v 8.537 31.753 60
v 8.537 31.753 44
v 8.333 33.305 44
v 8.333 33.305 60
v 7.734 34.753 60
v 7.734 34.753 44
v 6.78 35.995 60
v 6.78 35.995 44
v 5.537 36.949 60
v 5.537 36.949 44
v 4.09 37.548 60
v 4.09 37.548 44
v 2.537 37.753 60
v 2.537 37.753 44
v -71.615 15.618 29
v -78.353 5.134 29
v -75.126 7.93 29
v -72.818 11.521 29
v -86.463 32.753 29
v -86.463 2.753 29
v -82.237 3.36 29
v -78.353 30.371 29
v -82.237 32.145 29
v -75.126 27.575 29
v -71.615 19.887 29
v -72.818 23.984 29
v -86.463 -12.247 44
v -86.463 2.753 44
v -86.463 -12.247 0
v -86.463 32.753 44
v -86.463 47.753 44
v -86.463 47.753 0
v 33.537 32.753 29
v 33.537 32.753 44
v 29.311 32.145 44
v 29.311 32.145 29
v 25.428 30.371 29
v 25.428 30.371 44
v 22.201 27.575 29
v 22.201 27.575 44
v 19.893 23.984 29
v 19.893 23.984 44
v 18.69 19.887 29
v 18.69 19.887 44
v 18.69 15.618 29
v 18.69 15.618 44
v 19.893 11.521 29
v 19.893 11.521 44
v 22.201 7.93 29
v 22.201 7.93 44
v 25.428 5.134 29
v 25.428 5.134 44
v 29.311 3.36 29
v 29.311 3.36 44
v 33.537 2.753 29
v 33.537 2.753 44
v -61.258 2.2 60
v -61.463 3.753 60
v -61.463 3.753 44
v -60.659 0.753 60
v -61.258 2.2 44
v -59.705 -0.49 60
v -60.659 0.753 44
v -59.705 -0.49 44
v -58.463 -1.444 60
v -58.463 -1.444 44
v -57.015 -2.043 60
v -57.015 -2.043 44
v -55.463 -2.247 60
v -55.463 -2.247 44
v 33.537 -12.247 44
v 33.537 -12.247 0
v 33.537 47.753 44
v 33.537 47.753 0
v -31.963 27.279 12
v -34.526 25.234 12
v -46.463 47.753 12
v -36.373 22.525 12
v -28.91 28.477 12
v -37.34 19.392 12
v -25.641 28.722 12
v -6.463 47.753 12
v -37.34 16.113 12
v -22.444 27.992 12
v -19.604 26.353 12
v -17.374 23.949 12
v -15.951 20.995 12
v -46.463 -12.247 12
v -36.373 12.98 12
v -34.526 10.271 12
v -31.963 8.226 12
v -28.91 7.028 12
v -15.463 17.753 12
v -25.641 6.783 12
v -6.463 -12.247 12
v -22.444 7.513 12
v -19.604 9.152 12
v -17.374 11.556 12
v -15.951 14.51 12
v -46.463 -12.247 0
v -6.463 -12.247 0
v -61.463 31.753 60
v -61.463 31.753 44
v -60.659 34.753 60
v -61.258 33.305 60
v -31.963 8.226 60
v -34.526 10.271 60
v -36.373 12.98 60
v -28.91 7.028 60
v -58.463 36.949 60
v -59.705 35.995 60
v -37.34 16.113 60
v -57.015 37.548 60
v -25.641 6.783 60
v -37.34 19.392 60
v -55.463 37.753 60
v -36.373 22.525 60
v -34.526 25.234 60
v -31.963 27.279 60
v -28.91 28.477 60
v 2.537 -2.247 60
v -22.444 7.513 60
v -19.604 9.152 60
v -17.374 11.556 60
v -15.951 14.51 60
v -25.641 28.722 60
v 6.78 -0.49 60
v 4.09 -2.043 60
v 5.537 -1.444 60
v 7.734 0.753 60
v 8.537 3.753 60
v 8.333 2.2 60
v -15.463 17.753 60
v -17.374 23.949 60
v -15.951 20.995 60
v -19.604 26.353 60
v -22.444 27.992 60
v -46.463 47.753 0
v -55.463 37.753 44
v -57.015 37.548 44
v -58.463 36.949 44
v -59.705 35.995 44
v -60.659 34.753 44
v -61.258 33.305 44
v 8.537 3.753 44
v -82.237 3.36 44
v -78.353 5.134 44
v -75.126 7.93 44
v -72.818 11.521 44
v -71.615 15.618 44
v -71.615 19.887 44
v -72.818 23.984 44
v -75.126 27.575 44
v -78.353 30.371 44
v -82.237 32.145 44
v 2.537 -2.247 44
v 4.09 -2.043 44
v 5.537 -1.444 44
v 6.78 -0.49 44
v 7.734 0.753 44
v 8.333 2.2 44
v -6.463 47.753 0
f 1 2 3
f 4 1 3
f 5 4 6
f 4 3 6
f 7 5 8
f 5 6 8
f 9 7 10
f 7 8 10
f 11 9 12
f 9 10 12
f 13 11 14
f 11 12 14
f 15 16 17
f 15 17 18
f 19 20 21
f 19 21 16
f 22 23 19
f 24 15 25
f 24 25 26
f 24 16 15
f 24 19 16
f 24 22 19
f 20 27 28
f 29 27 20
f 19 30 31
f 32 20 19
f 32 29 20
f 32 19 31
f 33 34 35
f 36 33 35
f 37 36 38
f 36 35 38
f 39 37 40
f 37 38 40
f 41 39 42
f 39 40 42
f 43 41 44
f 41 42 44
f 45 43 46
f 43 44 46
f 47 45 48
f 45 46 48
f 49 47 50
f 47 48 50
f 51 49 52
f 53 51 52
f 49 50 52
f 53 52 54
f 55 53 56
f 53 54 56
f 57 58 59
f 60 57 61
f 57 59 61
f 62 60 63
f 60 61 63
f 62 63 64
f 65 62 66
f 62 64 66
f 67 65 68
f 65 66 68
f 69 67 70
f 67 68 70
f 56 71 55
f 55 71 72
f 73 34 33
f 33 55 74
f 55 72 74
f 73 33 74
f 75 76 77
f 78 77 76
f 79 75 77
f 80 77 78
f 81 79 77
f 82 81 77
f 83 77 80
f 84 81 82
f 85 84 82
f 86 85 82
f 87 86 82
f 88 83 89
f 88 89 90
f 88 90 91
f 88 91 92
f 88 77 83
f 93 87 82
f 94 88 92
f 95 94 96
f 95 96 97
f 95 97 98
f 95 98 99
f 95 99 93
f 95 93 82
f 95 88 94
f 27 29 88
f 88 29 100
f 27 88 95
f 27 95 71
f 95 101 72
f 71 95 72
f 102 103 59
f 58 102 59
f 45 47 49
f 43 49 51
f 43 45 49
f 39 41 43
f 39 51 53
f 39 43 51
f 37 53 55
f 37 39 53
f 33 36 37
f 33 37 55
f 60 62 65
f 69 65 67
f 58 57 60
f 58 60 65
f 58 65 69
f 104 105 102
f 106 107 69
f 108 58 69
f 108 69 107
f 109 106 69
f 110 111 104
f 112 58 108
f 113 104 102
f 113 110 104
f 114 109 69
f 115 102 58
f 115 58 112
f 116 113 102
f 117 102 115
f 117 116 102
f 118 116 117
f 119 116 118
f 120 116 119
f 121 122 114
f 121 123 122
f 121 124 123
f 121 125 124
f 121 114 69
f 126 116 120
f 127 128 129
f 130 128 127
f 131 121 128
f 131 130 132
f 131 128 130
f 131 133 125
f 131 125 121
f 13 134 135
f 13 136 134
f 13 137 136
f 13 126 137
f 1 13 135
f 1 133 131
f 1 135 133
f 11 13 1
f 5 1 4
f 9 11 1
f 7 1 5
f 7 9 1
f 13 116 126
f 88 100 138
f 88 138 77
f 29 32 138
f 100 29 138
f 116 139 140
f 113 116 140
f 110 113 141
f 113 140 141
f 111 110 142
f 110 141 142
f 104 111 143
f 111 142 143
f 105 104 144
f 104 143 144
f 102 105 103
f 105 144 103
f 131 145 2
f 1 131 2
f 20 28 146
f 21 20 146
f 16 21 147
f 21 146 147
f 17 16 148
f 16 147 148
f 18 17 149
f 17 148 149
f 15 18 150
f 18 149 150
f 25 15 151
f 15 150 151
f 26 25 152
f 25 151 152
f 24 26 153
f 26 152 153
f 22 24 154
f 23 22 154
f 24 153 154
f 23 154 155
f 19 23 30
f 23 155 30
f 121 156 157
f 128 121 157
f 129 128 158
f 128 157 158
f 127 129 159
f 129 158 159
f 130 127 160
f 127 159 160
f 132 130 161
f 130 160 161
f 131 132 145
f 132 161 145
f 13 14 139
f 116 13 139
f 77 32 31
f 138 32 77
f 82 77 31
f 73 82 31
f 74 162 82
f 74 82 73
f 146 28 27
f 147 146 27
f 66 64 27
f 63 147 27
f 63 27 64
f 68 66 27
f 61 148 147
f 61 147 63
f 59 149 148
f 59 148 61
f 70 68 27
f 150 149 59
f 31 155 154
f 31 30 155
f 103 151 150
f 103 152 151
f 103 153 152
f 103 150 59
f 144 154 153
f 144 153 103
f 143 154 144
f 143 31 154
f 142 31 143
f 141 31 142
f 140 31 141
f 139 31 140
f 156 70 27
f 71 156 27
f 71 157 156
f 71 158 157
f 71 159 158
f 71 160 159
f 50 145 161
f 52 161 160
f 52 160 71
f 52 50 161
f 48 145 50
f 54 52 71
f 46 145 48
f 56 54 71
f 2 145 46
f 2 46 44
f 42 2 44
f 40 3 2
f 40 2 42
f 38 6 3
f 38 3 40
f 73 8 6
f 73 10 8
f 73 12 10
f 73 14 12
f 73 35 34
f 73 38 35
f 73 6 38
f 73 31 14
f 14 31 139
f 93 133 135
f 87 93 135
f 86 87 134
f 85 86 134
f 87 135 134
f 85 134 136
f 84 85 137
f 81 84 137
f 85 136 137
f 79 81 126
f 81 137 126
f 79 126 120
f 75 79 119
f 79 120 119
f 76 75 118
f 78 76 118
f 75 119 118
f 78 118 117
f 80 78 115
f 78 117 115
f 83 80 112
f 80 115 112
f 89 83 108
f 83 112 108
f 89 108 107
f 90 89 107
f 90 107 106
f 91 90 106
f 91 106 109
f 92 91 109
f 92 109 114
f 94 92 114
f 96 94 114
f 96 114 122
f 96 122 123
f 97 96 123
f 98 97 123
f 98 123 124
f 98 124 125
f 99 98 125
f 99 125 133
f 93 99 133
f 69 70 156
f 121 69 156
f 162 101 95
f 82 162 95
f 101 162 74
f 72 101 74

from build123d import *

# Parameters (mm, degrees)
F0_W     = 120
F0_H     = 60
F1_DEPTH = 44
F3_DEPTH = 16
F5_DEPTH = 15
F6_W     = 40
F6_H     = 12
F7_DEPTH = 60
F8_R     = 11
F9_DEPTH = 60.001


with BuildPart() as f1:
    # F0 (on Top) → F1 (new body)
    with BuildSketch(Plane.XY):
        with Locations((-26.462575, 17.752543)):
            Rectangle(F0_W, F0_H)
    extrude(amount=F1_DEPTH)

    # F2 (on face) → F3 (join)
    with BuildSketch(Plane.XY.offset(44)):
        with BuildLine():
            ThreePointArc((-61.462575, 3.752543), (-59.705216, -0.490098), (-55.462575, -2.247457))
            Line((-55.462575, -2.247457), (2.537425, -2.247457))
            ThreePointArc((2.537425, -2.247457), (6.780066, -0.490098), (8.537425, 3.752543))
            Line((8.537425, 3.752543), (8.537425, 31.752543))
            ThreePointArc((8.537425, 31.752543), (6.780066, 35.995184), (2.537425, 37.752543))
            Line((2.537425, 37.752543), (-55.462575, 37.752543))
            ThreePointArc((-55.462575, 37.752543), (-59.705216, 35.995184), (-61.462575, 31.752543))
            Line((-61.462575, 31.752543), (-61.462575, 3.752543))
        make_face()
    extrude(amount=F3_DEPTH)

    # F4 (on face) → F5 (cut)
    with BuildSketch(Plane.XY.offset(44)):
        with BuildLine():
            Line((33.537425, 2.752543), (33.537425, 32.752543))
            ThreePointArc((33.537425, 32.752543), (18.537425, 17.752543), (33.537425, 2.752543))
        make_face()
        with BuildLine():
            Line((-86.462575, 32.752543), (-86.462575, 2.752543))
            ThreePointArc((-86.462575, 2.752543), (-71.462575, 17.752543), (-86.462575, 32.752543))
        make_face()
    extrude(amount=-F5_DEPTH, mode=Mode.SUBTRACT)

    # F6 (on face) → F7 (cut)
    with BuildSketch(Plane.XZ.offset(12.247457)):
        with Locations((-26.462575, 6)):
            Rectangle(F6_W, F6_H)
    extrude(amount=-F7_DEPTH, mode=Mode.SUBTRACT)

    # F8 (on face) → F9 (cut, through all)
    with BuildSketch(Plane.XY.offset(60)):
        with Locations((-26.462575, 17.752543)):
            Circle(F8_R)
    extrude(amount=-F9_DEPTH, mode=Mode.SUBTRACT)


solid = f1.part
